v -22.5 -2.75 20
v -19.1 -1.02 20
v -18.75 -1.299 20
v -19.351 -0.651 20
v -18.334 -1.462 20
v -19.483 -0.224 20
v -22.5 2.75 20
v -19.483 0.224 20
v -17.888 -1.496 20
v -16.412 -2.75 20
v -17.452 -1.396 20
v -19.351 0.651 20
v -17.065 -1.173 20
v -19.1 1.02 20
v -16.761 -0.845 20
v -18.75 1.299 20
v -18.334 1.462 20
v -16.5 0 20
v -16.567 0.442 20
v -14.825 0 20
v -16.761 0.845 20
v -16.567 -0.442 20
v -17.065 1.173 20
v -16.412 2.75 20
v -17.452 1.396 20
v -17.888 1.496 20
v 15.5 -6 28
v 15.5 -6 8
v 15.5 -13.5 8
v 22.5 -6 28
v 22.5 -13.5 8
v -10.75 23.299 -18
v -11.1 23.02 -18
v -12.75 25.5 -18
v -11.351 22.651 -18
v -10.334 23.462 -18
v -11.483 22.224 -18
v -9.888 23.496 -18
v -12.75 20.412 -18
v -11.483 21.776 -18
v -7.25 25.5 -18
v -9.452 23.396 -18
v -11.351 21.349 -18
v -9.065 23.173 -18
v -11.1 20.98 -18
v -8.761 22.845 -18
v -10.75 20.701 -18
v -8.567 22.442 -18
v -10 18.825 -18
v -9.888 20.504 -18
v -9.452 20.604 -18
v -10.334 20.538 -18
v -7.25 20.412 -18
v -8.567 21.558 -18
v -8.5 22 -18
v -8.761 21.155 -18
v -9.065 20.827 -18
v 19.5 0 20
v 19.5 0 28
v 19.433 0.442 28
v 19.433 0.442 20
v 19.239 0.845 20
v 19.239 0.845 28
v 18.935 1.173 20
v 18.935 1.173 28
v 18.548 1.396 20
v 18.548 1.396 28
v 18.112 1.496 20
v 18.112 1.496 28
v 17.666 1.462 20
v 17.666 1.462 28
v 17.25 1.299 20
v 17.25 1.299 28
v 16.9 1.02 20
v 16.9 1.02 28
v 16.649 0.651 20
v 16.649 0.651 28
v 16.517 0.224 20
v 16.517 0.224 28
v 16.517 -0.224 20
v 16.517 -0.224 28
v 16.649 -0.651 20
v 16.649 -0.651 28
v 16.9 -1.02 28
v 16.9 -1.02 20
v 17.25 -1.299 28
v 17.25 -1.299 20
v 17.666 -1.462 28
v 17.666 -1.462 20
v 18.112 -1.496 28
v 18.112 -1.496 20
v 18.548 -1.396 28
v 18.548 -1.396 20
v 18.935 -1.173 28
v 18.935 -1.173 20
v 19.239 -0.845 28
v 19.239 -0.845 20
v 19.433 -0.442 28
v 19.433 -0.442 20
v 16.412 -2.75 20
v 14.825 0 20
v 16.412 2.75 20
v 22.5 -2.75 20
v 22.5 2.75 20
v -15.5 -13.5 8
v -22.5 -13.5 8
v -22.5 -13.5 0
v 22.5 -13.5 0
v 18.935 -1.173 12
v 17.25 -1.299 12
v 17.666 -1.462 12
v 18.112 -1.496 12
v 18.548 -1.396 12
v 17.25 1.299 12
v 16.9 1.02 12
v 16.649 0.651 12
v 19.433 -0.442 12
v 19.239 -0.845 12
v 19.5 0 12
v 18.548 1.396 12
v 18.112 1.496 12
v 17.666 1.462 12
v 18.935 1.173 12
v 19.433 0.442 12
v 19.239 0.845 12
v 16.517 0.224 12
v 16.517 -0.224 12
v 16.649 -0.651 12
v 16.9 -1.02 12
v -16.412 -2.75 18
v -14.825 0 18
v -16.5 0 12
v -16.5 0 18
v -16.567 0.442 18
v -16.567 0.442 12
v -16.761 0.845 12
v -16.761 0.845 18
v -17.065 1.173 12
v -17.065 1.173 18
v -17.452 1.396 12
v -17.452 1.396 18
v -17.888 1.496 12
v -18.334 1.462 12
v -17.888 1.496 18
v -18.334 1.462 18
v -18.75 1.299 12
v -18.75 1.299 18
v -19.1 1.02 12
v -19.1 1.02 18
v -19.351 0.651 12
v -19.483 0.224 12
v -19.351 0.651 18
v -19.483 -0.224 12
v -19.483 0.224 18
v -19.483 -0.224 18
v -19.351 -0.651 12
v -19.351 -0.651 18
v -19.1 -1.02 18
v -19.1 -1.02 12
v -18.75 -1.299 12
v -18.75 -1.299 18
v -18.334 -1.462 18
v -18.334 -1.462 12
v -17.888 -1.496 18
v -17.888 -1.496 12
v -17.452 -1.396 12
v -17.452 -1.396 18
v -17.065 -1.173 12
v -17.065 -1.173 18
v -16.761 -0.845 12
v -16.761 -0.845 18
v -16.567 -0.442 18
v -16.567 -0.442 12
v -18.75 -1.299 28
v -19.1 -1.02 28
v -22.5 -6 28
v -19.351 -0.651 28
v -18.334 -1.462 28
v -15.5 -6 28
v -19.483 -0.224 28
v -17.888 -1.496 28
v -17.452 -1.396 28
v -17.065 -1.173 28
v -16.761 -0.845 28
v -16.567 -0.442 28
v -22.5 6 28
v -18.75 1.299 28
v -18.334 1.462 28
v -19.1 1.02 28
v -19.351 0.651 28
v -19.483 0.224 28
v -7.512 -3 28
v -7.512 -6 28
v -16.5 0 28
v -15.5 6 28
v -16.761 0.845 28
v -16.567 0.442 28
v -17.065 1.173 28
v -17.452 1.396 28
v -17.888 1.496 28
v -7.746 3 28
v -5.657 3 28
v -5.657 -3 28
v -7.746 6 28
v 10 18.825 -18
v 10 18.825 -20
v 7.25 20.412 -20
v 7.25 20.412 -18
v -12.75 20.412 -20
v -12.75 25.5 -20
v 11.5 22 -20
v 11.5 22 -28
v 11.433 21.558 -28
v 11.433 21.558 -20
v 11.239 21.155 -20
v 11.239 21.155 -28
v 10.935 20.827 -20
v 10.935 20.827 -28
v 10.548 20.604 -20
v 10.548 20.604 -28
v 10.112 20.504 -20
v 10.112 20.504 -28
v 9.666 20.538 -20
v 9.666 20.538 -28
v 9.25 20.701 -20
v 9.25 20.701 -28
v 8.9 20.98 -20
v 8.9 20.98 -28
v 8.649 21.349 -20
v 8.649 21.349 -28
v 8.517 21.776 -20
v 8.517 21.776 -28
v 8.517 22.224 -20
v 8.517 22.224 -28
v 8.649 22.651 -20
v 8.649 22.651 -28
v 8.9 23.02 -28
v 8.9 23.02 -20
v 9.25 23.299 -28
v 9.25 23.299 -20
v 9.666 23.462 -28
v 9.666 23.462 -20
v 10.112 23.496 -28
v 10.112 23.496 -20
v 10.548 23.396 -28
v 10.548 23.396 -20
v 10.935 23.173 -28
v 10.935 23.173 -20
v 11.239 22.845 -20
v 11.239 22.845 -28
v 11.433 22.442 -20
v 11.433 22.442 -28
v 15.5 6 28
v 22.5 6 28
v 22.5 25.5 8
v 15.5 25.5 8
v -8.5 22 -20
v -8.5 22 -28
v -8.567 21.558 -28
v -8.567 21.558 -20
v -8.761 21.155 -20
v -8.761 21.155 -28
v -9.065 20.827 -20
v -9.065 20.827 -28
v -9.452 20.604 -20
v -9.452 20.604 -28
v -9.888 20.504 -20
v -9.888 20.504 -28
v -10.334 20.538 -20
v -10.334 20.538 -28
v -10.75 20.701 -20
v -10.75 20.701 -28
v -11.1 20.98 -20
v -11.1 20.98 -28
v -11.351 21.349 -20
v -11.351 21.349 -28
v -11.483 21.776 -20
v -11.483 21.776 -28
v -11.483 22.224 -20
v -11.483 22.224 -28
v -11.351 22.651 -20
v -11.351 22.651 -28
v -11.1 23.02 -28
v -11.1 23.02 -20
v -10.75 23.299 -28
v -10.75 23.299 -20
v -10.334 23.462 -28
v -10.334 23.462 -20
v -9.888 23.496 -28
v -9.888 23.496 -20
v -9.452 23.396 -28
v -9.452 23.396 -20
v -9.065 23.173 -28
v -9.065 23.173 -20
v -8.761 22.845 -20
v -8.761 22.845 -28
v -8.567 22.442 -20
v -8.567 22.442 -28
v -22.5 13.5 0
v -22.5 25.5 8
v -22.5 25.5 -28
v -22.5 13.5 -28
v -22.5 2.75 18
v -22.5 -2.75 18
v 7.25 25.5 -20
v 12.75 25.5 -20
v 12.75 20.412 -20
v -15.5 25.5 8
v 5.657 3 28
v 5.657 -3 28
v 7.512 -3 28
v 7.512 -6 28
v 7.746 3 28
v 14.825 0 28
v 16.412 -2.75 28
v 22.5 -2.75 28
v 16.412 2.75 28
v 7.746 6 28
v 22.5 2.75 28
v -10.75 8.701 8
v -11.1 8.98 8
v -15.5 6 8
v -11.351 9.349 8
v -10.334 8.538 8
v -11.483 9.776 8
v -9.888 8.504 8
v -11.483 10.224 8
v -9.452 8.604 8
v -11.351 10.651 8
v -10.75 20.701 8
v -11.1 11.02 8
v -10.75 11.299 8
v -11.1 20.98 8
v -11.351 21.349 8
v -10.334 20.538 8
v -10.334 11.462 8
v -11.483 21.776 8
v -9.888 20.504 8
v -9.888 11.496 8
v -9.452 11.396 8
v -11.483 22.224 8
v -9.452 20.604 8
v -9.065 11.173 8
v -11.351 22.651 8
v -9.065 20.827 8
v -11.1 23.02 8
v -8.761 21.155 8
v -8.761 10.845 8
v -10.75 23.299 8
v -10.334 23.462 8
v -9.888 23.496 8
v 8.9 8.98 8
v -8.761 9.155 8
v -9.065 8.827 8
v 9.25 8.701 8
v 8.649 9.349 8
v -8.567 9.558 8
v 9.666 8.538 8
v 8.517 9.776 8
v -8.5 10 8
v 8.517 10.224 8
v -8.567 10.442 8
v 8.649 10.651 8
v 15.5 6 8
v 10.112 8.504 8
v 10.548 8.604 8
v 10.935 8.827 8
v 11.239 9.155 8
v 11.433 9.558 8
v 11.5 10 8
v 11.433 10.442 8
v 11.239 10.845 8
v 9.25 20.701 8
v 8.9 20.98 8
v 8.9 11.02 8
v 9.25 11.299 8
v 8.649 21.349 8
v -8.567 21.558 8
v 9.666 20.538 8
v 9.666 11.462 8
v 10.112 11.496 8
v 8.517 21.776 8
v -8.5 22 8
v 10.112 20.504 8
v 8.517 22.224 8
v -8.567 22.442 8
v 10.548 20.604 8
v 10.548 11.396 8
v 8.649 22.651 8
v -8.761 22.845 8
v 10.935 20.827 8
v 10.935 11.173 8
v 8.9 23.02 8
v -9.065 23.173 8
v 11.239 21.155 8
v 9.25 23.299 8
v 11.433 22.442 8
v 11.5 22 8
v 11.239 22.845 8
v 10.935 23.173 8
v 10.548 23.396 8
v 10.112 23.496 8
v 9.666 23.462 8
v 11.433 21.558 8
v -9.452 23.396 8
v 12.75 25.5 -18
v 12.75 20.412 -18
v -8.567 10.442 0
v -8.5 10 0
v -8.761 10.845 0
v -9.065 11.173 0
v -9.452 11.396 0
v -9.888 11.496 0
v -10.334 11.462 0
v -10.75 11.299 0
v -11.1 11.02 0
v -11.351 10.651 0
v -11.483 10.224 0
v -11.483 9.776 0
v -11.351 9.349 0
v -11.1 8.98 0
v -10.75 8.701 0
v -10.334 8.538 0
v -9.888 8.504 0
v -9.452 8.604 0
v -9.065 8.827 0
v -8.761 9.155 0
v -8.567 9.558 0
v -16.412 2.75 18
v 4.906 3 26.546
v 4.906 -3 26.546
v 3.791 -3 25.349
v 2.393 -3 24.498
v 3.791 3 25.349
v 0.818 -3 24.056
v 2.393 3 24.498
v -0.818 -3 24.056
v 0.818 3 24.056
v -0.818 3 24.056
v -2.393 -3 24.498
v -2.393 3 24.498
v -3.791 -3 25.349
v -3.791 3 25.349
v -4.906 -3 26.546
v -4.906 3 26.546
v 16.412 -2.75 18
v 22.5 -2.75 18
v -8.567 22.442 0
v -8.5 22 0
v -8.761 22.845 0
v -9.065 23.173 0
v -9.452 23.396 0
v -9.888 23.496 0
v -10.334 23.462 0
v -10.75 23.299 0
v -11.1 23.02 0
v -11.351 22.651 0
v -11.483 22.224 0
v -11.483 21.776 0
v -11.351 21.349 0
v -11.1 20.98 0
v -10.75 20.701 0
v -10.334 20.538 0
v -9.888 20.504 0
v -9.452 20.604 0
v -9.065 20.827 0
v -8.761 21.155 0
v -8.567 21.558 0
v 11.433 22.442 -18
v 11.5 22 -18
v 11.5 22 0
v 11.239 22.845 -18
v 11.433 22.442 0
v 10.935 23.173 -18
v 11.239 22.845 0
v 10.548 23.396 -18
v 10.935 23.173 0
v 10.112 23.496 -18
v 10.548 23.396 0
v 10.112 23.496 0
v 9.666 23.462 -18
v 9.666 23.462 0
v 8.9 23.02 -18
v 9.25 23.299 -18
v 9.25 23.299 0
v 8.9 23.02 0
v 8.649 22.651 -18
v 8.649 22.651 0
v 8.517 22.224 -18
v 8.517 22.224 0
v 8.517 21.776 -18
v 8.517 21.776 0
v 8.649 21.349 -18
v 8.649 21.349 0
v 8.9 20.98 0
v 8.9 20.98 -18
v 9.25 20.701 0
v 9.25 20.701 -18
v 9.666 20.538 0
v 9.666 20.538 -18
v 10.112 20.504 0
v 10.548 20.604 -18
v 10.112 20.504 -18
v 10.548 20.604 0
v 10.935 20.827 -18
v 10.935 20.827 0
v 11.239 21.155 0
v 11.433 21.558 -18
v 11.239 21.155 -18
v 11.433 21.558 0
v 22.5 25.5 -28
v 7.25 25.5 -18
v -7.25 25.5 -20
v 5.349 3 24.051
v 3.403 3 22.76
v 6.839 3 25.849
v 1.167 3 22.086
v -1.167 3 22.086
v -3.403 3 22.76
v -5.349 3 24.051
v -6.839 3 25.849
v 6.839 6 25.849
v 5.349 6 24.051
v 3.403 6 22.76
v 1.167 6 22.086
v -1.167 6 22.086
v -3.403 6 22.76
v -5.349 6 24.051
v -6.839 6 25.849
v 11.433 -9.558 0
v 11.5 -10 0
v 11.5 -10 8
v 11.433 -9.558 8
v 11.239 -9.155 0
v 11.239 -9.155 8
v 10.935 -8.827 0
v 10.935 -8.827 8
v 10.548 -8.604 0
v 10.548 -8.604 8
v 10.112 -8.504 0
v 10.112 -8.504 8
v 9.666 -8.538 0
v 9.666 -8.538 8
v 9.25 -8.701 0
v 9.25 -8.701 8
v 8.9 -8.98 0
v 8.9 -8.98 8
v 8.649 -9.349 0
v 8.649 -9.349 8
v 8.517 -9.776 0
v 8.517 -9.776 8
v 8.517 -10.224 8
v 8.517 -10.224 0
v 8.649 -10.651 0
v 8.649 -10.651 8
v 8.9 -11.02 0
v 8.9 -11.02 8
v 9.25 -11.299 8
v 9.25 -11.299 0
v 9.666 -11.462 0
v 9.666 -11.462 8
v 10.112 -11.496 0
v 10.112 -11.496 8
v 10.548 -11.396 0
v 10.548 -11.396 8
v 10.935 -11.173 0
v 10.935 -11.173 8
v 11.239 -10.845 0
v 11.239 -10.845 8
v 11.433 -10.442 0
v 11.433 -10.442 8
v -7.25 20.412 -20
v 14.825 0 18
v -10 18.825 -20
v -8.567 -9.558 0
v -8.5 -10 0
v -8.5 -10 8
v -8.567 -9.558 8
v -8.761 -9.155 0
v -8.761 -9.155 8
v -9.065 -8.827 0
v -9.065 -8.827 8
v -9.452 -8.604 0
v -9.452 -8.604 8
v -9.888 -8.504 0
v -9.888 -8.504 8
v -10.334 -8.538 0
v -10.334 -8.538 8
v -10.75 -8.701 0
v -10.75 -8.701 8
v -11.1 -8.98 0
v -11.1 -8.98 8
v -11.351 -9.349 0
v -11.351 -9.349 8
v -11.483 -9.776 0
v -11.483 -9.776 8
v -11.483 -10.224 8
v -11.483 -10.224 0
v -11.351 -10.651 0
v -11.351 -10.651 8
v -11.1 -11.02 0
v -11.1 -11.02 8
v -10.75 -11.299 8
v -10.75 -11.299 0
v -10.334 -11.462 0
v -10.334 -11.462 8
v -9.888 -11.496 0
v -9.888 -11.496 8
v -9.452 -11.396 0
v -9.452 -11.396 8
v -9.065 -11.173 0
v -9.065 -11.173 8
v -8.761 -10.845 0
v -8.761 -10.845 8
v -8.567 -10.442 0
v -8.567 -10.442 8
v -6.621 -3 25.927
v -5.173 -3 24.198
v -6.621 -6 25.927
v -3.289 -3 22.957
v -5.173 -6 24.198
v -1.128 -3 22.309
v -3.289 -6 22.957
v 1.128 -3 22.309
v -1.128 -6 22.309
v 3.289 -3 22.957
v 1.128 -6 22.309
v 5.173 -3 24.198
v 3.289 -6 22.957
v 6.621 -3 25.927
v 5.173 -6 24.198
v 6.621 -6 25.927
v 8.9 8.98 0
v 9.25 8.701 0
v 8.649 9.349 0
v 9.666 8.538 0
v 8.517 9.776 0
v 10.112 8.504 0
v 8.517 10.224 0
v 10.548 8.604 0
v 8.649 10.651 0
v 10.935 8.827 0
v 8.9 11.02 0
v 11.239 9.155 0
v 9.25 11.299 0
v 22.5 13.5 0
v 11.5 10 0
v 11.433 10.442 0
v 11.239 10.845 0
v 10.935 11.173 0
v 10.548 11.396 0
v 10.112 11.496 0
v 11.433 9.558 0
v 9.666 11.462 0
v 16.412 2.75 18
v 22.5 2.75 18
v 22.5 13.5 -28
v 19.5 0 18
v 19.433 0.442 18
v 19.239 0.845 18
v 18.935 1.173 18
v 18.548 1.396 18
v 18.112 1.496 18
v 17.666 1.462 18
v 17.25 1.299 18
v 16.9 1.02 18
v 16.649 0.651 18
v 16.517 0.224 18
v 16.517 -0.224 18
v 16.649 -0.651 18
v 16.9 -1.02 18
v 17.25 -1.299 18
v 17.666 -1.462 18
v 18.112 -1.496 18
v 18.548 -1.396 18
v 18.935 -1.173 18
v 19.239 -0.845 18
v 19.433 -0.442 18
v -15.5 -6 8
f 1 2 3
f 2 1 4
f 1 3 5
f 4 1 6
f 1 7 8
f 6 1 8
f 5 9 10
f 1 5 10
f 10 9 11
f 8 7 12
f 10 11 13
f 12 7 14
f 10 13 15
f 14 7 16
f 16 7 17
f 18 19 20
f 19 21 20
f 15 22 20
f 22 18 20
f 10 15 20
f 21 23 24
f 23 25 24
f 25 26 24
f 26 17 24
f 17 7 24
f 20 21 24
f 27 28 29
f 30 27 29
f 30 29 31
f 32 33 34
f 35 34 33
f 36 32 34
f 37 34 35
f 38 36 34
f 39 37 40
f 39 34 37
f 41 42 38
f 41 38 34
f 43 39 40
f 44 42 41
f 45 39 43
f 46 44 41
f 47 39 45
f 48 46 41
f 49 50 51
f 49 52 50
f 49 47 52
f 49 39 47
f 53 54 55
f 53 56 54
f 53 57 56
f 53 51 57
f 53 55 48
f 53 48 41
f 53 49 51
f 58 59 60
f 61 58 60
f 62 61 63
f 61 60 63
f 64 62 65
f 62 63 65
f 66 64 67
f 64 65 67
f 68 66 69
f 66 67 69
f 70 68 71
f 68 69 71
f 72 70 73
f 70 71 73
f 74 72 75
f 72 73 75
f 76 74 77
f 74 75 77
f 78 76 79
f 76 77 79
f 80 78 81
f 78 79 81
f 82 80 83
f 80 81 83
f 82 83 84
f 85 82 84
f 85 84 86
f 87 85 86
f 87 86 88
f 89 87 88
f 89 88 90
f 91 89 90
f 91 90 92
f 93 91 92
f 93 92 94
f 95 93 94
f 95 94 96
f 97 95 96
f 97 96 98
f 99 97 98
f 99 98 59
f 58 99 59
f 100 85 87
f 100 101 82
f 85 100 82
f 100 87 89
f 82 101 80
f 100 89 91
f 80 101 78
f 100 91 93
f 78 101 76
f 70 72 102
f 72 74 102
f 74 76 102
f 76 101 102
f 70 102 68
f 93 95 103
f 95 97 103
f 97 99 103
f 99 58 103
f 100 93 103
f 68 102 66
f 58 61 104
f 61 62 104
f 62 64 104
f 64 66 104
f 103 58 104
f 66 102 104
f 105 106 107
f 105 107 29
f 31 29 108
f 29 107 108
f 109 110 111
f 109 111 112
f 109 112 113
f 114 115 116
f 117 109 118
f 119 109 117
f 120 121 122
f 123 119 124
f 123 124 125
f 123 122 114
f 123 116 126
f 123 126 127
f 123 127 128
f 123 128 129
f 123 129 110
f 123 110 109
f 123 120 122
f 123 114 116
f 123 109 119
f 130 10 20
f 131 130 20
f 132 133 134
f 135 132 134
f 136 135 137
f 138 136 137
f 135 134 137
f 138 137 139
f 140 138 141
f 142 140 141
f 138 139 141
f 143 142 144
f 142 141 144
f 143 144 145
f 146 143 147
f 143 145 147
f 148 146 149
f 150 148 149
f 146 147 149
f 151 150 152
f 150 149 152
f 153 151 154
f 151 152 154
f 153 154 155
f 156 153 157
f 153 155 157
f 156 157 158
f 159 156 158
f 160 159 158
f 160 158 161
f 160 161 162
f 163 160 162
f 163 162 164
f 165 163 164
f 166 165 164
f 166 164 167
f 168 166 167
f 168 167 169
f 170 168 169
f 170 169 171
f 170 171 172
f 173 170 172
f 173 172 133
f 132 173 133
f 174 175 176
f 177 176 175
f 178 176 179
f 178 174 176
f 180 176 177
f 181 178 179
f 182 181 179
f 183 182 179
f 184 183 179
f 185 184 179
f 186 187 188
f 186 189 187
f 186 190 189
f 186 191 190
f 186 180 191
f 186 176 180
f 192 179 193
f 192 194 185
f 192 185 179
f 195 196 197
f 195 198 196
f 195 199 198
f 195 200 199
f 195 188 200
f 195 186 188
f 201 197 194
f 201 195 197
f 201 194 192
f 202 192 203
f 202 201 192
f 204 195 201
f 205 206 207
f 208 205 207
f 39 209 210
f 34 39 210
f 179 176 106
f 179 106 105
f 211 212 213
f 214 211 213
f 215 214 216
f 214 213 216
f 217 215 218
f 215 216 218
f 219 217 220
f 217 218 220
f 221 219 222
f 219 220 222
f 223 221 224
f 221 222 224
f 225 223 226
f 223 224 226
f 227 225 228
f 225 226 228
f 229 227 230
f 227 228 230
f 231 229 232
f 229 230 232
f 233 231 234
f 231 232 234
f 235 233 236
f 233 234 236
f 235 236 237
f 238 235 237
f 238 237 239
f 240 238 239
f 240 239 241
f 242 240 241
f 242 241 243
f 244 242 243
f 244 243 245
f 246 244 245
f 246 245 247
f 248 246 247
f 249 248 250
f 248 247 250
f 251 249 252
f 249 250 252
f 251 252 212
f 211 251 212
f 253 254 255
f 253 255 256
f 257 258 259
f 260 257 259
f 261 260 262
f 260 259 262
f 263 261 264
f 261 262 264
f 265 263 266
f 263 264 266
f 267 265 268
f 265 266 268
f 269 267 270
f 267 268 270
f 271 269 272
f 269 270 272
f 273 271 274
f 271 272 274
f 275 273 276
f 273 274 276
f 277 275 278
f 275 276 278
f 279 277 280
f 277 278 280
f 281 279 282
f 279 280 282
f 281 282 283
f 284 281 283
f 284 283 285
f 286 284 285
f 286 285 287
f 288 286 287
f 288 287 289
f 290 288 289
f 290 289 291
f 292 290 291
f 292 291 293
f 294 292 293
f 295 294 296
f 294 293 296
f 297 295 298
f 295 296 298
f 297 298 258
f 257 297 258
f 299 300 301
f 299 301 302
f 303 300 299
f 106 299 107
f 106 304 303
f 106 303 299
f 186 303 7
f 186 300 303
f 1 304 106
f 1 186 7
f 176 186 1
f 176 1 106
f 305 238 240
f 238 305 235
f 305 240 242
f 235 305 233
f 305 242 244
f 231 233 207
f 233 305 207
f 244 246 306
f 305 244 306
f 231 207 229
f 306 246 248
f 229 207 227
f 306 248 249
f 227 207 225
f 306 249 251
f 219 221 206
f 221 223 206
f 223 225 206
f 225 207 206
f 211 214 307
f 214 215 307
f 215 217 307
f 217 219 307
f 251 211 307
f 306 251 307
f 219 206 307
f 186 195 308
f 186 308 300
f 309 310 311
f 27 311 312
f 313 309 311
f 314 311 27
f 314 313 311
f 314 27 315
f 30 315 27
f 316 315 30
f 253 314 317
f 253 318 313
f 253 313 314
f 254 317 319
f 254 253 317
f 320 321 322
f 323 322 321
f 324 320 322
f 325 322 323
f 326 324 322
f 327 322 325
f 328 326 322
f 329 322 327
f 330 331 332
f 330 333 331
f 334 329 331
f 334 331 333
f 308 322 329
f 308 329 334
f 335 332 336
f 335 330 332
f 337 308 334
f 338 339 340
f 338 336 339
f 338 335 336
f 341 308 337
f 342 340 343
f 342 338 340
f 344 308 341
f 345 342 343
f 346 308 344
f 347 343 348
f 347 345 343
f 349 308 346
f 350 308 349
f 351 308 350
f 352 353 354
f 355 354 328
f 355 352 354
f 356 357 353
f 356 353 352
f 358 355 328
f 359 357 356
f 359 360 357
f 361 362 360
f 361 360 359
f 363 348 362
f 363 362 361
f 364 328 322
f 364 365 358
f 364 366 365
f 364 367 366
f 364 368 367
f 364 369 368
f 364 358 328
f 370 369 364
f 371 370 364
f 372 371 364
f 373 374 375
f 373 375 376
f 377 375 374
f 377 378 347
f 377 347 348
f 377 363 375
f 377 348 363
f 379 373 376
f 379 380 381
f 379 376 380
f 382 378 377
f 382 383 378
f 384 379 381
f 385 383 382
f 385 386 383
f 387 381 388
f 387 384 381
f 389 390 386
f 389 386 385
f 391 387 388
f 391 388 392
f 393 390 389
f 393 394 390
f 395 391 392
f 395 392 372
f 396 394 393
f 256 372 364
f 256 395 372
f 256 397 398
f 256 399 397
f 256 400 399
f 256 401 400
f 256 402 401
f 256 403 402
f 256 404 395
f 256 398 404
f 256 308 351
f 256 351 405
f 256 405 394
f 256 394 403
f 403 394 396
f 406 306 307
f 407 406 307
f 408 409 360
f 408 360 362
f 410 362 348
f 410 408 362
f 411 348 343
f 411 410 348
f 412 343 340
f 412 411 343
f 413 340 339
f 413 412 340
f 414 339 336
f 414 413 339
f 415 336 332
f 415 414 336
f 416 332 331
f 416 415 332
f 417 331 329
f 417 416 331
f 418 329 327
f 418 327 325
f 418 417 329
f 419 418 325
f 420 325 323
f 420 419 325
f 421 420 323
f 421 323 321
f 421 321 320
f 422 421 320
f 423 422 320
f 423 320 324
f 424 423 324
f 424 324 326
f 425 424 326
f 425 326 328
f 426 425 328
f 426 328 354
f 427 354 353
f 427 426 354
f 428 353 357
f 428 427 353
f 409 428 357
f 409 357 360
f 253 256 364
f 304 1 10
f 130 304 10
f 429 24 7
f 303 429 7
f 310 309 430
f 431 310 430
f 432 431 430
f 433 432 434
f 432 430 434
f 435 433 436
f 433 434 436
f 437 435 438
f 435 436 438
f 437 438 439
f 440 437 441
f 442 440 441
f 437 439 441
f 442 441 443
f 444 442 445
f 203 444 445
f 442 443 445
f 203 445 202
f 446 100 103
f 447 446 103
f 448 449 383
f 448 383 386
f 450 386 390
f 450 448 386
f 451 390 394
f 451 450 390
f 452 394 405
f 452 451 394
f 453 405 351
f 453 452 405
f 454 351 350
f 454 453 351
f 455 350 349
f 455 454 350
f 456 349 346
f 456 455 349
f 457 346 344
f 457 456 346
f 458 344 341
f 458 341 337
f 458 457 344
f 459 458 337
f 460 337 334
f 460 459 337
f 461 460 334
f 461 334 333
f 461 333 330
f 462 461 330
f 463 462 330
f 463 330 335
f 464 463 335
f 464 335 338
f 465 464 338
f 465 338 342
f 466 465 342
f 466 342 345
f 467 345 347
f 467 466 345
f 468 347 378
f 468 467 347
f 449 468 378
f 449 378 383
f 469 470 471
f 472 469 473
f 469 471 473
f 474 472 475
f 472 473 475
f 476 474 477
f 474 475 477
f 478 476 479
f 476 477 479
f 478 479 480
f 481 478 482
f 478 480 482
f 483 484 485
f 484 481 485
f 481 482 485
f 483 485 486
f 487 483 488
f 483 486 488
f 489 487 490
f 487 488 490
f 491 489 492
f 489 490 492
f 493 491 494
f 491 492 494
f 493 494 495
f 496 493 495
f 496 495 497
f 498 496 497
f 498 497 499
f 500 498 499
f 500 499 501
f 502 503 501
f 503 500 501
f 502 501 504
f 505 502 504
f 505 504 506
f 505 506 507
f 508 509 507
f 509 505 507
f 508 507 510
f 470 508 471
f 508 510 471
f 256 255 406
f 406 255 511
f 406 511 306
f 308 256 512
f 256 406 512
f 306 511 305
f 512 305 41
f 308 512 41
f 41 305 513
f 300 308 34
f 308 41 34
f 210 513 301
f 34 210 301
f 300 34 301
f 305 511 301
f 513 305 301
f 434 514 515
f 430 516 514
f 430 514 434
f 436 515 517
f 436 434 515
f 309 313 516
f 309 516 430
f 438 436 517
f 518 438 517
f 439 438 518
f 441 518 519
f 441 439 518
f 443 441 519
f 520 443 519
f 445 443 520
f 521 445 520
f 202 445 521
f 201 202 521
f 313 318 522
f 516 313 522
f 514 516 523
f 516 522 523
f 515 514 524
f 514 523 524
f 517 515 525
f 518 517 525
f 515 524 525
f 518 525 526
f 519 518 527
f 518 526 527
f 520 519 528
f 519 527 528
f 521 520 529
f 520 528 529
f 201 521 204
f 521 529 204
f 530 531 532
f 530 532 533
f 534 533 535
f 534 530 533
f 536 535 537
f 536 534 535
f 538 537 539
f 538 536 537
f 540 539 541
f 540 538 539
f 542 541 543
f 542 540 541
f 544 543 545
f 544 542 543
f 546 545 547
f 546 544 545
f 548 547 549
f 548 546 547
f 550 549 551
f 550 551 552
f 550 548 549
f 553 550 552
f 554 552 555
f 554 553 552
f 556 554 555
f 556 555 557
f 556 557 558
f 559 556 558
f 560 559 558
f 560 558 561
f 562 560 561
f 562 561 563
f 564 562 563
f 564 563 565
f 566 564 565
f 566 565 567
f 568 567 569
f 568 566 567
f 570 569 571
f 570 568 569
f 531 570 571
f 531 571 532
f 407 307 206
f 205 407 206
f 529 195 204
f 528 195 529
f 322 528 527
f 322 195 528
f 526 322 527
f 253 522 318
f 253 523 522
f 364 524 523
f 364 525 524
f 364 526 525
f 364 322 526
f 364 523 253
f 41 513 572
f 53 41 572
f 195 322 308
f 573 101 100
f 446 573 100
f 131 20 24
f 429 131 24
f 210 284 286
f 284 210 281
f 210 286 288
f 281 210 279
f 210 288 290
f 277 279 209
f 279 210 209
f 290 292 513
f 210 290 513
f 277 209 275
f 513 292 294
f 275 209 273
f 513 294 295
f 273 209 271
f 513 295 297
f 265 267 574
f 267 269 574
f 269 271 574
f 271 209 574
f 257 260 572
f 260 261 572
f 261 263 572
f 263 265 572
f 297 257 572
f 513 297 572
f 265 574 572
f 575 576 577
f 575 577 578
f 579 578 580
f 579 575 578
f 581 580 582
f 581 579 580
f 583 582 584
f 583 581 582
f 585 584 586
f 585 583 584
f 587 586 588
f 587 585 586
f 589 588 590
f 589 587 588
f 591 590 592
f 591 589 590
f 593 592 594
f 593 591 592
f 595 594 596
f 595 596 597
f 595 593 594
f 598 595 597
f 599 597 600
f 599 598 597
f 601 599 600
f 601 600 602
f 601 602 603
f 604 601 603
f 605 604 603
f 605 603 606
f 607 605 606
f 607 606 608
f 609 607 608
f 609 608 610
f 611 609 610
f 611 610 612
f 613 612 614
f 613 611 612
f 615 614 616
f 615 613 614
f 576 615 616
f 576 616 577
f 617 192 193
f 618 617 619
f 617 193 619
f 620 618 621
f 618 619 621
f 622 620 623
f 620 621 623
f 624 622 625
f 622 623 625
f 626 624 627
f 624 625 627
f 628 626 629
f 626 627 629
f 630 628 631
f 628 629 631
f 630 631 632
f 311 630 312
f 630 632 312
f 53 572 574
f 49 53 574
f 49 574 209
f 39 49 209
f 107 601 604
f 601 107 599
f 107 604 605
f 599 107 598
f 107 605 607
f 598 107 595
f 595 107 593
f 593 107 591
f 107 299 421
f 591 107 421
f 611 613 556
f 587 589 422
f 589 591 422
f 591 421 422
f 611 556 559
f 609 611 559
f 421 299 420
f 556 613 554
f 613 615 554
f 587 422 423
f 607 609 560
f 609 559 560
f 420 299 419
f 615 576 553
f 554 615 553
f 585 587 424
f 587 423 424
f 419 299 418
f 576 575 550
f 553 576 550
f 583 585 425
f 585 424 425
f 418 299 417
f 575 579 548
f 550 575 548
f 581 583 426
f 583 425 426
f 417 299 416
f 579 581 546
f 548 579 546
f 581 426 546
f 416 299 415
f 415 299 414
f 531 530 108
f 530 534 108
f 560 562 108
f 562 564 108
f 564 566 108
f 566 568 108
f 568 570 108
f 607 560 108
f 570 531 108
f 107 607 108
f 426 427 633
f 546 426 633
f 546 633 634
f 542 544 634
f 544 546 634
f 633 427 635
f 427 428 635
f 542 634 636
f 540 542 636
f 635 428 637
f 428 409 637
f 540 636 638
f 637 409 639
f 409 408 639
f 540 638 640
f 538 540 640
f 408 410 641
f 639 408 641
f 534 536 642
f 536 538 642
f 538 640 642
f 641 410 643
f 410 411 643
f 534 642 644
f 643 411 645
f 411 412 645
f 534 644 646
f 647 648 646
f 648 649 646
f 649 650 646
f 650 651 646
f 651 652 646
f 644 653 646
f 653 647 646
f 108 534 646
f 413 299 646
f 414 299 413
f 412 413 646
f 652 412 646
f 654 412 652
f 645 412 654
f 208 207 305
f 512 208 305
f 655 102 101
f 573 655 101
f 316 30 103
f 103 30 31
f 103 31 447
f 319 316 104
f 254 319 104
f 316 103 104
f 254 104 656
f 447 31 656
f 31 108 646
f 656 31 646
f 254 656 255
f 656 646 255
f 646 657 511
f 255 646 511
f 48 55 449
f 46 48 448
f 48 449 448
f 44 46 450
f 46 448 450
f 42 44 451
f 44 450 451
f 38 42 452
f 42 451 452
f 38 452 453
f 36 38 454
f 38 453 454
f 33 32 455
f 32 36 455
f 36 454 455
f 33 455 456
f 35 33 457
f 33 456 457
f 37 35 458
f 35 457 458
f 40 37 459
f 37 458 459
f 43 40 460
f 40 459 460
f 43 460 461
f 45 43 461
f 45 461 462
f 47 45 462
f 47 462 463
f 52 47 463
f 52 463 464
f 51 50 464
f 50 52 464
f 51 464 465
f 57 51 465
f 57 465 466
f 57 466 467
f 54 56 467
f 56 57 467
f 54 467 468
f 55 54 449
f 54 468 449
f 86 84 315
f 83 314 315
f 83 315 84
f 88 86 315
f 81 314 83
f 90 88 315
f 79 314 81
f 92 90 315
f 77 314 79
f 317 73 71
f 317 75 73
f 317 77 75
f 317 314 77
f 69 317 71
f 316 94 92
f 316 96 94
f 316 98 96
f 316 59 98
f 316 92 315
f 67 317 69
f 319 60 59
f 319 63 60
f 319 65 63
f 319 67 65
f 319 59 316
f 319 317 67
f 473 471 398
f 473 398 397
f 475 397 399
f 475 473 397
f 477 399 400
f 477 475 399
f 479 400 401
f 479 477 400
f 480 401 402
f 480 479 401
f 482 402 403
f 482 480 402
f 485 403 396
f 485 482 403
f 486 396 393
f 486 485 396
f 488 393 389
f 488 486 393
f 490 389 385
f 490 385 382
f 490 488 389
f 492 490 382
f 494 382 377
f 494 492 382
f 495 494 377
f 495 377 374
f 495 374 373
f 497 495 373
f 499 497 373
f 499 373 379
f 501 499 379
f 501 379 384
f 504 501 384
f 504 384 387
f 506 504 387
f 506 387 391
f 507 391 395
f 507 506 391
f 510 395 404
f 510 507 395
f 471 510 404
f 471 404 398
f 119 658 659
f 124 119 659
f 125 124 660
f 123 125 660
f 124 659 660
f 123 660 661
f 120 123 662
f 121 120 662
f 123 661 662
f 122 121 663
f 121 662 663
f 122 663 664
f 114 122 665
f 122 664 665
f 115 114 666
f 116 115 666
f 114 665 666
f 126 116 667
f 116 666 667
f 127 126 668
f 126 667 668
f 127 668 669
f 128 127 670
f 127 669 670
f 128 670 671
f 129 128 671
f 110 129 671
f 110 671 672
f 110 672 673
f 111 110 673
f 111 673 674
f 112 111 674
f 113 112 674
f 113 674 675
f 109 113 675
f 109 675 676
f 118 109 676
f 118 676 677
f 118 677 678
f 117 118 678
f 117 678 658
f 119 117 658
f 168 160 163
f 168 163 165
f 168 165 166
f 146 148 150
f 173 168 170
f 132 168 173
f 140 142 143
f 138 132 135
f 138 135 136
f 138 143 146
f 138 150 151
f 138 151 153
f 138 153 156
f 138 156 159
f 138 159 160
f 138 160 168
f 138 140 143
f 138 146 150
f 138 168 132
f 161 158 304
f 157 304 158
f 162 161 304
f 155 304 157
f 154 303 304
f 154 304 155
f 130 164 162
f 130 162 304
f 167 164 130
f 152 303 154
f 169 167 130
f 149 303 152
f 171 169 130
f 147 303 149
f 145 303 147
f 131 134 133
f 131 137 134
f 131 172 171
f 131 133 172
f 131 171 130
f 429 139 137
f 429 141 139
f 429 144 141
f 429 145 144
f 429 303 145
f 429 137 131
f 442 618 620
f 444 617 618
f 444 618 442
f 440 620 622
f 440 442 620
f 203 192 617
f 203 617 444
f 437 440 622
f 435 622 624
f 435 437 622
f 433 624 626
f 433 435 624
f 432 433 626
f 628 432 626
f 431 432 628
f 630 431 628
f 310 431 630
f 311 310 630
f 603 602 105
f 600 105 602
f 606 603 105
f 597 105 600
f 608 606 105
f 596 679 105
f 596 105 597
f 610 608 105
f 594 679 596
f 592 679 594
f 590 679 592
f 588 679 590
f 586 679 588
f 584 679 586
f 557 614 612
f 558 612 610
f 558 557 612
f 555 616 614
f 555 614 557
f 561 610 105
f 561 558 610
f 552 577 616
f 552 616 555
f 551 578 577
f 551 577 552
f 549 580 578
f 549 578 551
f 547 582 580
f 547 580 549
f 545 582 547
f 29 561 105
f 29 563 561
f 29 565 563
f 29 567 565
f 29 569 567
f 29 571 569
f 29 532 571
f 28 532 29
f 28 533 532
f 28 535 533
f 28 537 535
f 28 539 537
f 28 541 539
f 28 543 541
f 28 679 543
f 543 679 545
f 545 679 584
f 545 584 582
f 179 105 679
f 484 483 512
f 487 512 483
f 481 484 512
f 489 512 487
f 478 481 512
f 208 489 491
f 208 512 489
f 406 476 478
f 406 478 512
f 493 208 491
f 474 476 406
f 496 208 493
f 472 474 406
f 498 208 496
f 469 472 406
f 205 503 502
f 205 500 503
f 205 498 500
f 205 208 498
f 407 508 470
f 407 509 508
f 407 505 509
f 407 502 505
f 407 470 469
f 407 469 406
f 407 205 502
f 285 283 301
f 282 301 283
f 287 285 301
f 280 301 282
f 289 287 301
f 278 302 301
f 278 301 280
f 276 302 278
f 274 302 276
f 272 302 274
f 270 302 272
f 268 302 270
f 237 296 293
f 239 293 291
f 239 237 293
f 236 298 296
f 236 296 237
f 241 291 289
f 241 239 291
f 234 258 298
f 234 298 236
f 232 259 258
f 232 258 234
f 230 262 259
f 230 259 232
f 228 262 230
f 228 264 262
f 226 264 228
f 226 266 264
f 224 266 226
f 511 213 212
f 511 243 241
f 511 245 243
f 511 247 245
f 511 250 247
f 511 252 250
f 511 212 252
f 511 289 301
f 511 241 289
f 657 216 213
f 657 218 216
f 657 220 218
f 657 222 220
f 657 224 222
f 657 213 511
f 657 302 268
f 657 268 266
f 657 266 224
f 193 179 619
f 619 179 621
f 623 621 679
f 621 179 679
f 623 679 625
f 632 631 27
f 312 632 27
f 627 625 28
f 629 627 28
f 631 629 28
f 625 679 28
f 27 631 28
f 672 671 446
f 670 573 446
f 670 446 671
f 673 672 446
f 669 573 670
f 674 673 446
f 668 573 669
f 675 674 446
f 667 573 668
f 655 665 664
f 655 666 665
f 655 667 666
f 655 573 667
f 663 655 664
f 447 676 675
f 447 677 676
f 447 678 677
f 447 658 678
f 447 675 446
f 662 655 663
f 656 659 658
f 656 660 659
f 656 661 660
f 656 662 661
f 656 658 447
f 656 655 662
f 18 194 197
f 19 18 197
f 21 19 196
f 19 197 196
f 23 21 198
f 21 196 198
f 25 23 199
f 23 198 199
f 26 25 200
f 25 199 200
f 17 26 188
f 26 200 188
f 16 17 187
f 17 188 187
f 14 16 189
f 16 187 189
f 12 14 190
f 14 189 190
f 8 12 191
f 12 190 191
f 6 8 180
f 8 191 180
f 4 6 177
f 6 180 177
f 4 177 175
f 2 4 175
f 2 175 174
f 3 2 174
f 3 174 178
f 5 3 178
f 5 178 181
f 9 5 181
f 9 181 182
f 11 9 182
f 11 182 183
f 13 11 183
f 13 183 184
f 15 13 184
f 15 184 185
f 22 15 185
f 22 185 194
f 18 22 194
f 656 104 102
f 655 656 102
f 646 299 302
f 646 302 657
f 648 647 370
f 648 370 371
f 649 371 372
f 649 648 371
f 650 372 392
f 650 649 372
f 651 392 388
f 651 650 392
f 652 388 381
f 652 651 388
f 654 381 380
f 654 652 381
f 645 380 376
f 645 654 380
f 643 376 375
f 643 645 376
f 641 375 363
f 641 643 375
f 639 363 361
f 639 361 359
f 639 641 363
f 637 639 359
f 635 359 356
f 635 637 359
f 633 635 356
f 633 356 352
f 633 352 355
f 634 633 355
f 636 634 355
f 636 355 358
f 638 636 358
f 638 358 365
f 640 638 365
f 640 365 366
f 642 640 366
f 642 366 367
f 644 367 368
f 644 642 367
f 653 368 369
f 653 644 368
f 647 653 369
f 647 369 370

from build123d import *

# Parameters (mm, degrees)
F0_W      = 45
F0_H      = 27
F0_R      = 1.5
F0_H_2    = 12
F1_DEPTH  = 8
F2_DEPTH  = 28
F3_R      = 1.5
F4_DEPTH  = 10
F5_DEPTH  = 8
F6_W      = 31
F6_H      = 12
F7_DEPTH  = 20
F8_SIZE2  = 19.5
F8_SIZE   = 20
F9_SIZE2  = 7.5
F9_SIZE   = 20
F11_DEPTH = 19.501
F12_DEPTH = 3
F13_R     = 7.7732339674
F14_DEPTH = 3
F16_DEPTH = 10
F17_DEPTH = 8
F18_R     = 1.5
F19_DEPTH = 16


with BuildPart() as f1:
    # F0 (on Top) → F1 (new body)
    with BuildSketch(Plane.XY):
        Rectangle(F0_W, F0_H)
        with Locations((-10, -10)):
            Circle(F0_R, mode=Mode.SUBTRACT)
        with Locations((10, -10)):
            Circle(F0_R, mode=Mode.SUBTRACT)
        with Locations((-10, 10)):
            Circle(F0_R, mode=Mode.SUBTRACT)
        with Locations((10, 10)):
            Circle(F0_R, mode=Mode.SUBTRACT)
        with Locations((0, 19.5)):
            Rectangle(F0_W, F0_H_2)
        with Locations((-10, 22)):
            Circle(F0_R, mode=Mode.SUBTRACT)
        with Locations((10, 22)):
            Circle(F0_R, mode=Mode.SUBTRACT)
    extrude(amount=F1_DEPTH)

    # F0 (on Top) → F2 (join)
    with BuildSketch(Plane.XY):
        with Locations((0, 19.5)):
            Rectangle(F0_W, F0_H_2)
        with Locations((-10, 22)):
            Circle(F0_R, mode=Mode.SUBTRACT)
        with Locations((10, 22)):
            Circle(F0_R, mode=Mode.SUBTRACT)
    extrude(amount=-F2_DEPTH)

    # F3 (on face) → F4 (cut)
    with BuildSketch(Plane(origin=(0, 0, -28), x_dir=(1, 0, 0), z_dir=(0, 0, -1))):
        Polygon((-7.25, -20.4122867597), (-10, -18.8245735195), (-12.75, -20.4122867597), (-12.75, -23.5877132403), (-12.75, -25.5), (-7.25, -25.5), (-7.25, -23.5877132403), align=None)
        with Locations((-10, -22)):
            Circle(F3_R, mode=Mode.SUBTRACT)
        Polygon((7.25, -23.5877132403), (7.25, -25.5), (12.75, -25.5), (12.75, -23.5877132403), (12.75, -20.4122867597), (10, -18.8245735195), (7.25, -20.4122867597), align=None)
        with Locations((10, -22)):
            Circle(F3_R, mode=Mode.SUBTRACT)
    extrude(amount=-F4_DEPTH, mode=Mode.SUBTRACT)

    # F3 (on face) → F5 (join)
    with BuildSketch(Plane(origin=(0, 0, -28), x_dir=(1, 0, 0), z_dir=(0, 0, -1))):
        Polygon((7.25, -23.5877132403), (7.25, -25.5), (12.75, -25.5), (12.75, -23.5877132403), (12.75, -20.4122867597), (10, -18.8245735195), (7.25, -20.4122867597), align=None)
        with Locations((10, -22)):
            Circle(F3_R, mode=Mode.SUBTRACT)
        Polygon((-7.25, -20.4122867597), (-10, -18.8245735195), (-12.75, -20.4122867597), (-12.75, -23.5877132403), (-12.75, -25.5), (-7.25, -25.5), (-7.25, -23.5877132403), align=None)
        with Locations((-10, -22)):
            Circle(F3_R, mode=Mode.SUBTRACT)
    extrude(amount=-F5_DEPTH)

    # F6 (on face) → F7 (join)
    with BuildSketch(Plane.XY.offset(8)):
        Polygon((-22.5, 25.5), (-22.5, -13.5), (-15.5, -13.5), (-15.5, -6), (-15.5, 6), (-15.5, 25.5), align=None)
        Rectangle(F6_W, F6_H)
        Polygon((15.5, 6), (15.5, -6), (15.5, -13.5), (22.5, -13.5), (22.5, 25.5), (15.5, 25.5), align=None)
    extrude(amount=F7_DEPTH)

    # F8
    f8_edges = [f1.edges().sort_by_distance(p)[0] for p in [
        (-19, 25.5, 28),
        (19, 25.5, 28),
    ]]
    f8_side = f1.faces().sort_by_distance((0, 25.5, -5.719915))[0]
    chamfer(f8_edges, length=F8_SIZE, length2=F8_SIZE2, reference=f8_side)

    # F9
    f9_edges = [f1.edges().sort_by_distance(p)[0] for p in [
        (19, -13.5, 28),
        (-19, -13.5, 28),
    ]]
    f9_side = f1.faces().sort_by_distance((-21.97, -13.5, 14))[0]
    chamfer(f9_edges, length=F9_SIZE, length2=F9_SIZE2, reference=f9_side)

    # F10 (on face) → F11 (cut, through all)
    with BuildSketch(Plane(origin=(0, 6, 0), x_dir=(-1, 0, 0), z_dir=(0, 1, 0))):
        with BuildLine():
            Line((5.6568542495, 28), (-5.6568542495, 28))
            ThreePointArc((-5.6568542495, 28), (0, 24), (5.6568542495, 28))
        make_face()
    extrude(amount=-F11_DEPTH, mode=Mode.SUBTRACT)

    # F10 (on face) → F12 (cut)
    with BuildSketch(Plane(origin=(0, 6, 0), x_dir=(-1, 0, 0), z_dir=(0, 1, 0))):
        with BuildLine():
            Line((-5.6568542495, 28), (-7.7459666924, 28))
            ThreePointArc((-7.7459666924, 28), (0, 22), (7.7459666924, 28))
            Line((7.7459666924, 28), (5.6568542495, 28))
            ThreePointArc((5.6568542495, 28), (0, 24), (-5.6568542495, 28))
        make_face()
    extrude(amount=-F12_DEPTH, mode=Mode.SUBTRACT)

    # F13 (on face) → F14 (cut)
    with BuildSketch(Plane.XZ.offset(6)):
        with Locations((0, 30)):
            Circle(F13_R)
    extrude(amount=-F14_DEPTH, mode=Mode.SUBTRACT)

    # F15 (on face) → F16 (cut)
    with BuildSketch(Plane.XY.offset(28)):
        Polygon((-19.5877132403, -2.75), (-16.4122867597, -2.75), (-14.8245735195, 0), (-16.4122867597, 2.75), (-19.5877132403, 2.75), (-22.5, 2.75), (-22.5, -2.75), align=None)
        Polygon((14.8245735195, 0), (16.4122867597, -2.75), (19.5877132403, -2.75), (22.5, -2.75), (22.5, 2.75), (19.5877132403, 2.75), (16.4122867597, 2.75), align=None)
    extrude(amount=-F16_DEPTH, mode=Mode.SUBTRACT)

    # F15 (on face) → F17 (join)
    with BuildSketch(Plane.XY.offset(28)):
        Polygon((-19.5877132403, -2.75), (-16.4122867597, -2.75), (-14.8245735195, 0), (-16.4122867597, 2.75), (-19.5877132403, 2.75), (-22.5, 2.75), (-22.5, -2.75), align=None)
        Polygon((14.8245735195, 0), (16.4122867597, -2.75), (19.5877132403, -2.75), (22.5, -2.75), (22.5, 2.75), (19.5877132403, 2.75), (16.4122867597, 2.75), align=None)
    extrude(amount=-F17_DEPTH)

    # F18 (on face) → F19 (cut)
    with BuildSketch(Plane.XY.offset(28)):
        with Locations((-18, 0)):
            Circle(F18_R)
        with Locations((18, 0)):
            Circle(F18_R)
    extrude(amount=-F19_DEPTH, mode=Mode.SUBTRACT)


solid = f1.part
